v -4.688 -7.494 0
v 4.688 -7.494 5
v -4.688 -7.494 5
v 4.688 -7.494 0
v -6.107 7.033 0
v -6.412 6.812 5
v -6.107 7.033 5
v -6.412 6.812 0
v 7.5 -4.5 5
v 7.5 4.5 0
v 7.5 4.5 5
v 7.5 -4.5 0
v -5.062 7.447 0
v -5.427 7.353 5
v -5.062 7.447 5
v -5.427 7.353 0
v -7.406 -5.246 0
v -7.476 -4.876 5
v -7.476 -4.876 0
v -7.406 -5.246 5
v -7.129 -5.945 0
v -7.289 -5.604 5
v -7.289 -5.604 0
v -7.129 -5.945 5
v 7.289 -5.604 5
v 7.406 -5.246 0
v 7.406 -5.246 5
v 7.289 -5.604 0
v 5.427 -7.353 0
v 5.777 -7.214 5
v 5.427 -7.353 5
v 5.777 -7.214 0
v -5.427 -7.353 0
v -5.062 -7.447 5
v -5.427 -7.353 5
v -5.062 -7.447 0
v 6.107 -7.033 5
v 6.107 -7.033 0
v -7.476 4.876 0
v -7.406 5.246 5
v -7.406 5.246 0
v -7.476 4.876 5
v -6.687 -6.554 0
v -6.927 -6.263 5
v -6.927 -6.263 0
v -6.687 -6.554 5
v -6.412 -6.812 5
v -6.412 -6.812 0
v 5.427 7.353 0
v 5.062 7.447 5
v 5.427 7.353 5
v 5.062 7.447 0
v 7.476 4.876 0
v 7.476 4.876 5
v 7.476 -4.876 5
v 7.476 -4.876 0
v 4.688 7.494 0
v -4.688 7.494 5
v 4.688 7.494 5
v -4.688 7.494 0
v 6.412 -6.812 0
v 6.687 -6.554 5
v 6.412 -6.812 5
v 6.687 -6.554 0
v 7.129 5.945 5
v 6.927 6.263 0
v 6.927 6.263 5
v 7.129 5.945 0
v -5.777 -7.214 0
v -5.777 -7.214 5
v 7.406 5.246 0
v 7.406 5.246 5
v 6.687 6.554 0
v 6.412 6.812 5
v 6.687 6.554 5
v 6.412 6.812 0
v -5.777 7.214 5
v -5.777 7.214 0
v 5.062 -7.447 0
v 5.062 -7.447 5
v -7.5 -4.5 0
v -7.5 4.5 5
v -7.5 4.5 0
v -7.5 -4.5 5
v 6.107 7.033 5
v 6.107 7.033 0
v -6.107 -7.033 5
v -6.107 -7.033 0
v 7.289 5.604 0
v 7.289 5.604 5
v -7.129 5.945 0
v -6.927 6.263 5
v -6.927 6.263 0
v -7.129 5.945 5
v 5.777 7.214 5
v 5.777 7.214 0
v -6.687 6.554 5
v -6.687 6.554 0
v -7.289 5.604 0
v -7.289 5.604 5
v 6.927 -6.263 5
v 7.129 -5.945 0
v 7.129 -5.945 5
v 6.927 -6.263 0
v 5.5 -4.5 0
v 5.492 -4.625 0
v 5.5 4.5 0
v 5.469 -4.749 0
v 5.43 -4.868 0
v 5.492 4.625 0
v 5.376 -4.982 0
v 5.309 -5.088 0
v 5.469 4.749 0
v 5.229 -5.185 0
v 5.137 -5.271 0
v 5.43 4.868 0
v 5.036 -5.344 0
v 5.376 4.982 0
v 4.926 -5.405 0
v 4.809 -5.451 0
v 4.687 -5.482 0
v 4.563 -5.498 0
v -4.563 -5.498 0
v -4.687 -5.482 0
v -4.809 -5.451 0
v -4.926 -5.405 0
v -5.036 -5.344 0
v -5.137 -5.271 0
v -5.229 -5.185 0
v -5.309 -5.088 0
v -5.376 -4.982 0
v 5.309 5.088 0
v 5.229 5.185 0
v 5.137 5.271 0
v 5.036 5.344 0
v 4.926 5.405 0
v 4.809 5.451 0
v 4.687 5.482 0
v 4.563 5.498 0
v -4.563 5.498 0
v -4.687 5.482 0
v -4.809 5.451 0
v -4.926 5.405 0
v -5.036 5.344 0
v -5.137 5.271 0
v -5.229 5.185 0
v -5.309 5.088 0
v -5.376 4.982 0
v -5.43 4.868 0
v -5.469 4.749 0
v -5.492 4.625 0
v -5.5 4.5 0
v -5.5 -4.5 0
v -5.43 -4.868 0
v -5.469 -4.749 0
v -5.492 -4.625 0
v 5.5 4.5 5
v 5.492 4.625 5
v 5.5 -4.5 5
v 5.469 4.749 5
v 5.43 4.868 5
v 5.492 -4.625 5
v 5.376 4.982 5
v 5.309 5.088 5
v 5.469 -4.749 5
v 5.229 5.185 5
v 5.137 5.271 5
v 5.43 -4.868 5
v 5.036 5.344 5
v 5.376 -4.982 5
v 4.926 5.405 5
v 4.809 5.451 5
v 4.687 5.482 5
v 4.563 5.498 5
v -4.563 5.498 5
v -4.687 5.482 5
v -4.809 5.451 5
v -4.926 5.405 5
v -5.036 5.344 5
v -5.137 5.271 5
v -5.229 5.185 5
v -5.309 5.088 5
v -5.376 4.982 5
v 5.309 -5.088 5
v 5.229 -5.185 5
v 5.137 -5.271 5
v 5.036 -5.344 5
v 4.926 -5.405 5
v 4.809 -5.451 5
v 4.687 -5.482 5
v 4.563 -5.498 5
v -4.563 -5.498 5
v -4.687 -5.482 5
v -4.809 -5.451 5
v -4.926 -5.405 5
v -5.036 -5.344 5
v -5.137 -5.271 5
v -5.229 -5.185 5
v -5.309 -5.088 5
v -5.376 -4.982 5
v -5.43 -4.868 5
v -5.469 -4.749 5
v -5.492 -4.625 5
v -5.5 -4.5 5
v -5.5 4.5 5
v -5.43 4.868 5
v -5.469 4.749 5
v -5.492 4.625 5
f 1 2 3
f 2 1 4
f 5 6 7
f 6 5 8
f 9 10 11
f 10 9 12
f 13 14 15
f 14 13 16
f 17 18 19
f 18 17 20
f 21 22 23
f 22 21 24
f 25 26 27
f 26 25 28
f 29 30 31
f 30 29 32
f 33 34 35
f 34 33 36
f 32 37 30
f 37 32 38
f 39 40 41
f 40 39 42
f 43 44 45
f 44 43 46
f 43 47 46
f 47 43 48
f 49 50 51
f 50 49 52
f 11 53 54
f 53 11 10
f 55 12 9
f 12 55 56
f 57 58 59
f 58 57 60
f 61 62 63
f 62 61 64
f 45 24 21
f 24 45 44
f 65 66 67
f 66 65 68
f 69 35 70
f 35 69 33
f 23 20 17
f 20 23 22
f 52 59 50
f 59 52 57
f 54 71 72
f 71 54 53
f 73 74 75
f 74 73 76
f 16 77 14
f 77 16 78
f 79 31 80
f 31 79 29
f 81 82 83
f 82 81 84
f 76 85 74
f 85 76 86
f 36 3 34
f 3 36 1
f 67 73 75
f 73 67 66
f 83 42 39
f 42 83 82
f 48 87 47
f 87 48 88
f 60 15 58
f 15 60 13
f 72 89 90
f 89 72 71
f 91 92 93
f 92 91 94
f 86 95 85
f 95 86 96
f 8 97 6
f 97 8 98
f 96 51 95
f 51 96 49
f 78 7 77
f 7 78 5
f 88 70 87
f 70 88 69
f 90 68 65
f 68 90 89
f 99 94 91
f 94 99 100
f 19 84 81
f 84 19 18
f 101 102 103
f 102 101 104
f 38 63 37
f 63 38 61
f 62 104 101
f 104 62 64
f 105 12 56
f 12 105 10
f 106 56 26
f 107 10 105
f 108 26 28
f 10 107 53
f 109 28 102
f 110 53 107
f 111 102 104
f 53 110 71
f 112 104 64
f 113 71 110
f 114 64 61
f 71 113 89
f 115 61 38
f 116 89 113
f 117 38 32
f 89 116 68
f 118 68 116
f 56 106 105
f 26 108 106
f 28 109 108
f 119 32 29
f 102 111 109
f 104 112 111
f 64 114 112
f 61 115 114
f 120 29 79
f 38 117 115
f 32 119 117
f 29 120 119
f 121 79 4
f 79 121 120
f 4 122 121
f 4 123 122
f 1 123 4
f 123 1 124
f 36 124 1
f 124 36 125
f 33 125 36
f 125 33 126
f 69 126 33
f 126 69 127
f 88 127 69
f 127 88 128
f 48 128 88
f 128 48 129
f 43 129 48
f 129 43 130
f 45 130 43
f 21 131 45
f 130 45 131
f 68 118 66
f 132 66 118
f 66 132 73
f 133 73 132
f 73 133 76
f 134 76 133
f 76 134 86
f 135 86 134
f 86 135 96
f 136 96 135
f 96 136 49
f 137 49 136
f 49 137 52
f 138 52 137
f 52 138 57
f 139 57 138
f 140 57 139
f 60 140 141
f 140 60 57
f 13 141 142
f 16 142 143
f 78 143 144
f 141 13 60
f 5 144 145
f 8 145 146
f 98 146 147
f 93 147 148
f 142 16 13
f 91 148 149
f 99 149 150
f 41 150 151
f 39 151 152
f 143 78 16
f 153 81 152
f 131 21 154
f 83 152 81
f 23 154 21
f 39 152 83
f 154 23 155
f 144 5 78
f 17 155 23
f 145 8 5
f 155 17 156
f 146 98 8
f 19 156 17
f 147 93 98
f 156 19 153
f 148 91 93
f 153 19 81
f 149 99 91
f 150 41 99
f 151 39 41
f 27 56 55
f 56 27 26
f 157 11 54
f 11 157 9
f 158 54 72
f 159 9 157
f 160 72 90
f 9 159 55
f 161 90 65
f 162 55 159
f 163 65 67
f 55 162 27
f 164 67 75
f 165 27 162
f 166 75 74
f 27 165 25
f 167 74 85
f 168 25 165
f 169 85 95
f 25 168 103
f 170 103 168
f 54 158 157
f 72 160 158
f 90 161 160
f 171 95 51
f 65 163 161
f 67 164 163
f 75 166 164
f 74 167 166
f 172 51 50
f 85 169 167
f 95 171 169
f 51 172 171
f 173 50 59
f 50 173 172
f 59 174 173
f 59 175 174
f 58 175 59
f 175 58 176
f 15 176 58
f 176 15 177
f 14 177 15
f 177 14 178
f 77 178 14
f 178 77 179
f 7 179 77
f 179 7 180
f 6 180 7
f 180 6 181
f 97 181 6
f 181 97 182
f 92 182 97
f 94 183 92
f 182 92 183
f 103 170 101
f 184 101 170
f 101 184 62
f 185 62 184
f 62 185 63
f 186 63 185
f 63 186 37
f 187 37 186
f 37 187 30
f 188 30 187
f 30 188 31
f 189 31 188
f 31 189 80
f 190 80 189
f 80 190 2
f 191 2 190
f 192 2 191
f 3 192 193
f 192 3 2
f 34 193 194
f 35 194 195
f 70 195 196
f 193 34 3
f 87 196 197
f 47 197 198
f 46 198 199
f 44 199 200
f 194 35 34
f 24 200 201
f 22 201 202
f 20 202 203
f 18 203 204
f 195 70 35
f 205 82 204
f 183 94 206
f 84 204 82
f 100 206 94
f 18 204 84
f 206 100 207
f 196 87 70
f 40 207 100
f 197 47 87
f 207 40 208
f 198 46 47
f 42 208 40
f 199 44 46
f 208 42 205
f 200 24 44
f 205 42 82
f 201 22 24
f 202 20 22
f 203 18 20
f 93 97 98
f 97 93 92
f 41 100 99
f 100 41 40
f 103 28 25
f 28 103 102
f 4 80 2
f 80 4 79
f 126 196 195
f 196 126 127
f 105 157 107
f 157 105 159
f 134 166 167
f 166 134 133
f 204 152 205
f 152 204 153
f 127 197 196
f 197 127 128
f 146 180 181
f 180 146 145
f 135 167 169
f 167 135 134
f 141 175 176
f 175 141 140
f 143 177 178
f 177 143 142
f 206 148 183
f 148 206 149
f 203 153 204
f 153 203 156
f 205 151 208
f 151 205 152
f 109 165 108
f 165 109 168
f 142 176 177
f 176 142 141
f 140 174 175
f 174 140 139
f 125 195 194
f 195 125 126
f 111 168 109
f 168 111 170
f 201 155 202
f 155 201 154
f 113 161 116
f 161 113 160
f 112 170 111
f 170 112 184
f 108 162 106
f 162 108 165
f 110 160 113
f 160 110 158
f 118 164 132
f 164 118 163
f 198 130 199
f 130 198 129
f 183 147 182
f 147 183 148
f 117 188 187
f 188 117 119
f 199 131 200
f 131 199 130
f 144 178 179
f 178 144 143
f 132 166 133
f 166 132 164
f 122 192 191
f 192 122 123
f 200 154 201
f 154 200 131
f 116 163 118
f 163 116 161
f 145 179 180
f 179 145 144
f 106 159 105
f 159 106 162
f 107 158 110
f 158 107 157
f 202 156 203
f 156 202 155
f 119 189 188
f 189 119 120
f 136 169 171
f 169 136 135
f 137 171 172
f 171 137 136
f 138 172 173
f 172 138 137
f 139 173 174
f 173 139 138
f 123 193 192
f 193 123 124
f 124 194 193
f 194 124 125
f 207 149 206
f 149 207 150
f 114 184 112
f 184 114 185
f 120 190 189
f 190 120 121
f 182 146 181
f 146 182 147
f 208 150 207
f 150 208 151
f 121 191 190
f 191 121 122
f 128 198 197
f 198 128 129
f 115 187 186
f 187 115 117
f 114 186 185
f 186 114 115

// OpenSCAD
$fn = 50;


difference() {
	union() {
		translate(v = [0, 0, 0]) {
			rotate(a = [0, 0, 0]) {
				difference() {
					union() {
						hull() {
							translate(v = [-4.5000000000, 4.5000000000, 0]) {
								cylinder(h = 5, r = 3);
							}
							translate(v = [4.5000000000, 4.5000000000, 0]) {
								cylinder(h = 5, r = 3);
							}
							translate(v = [-4.5000000000, -4.5000000000, 0]) {
								cylinder(h = 5, r = 3);
							}
							translate(v = [4.5000000000, -4.5000000000, 0]) {
								cylinder(h = 5, r = 3);
							}
						}
					}
					union() {
						hull() {
							translate(v = [-4.5000000000, 4.5000000000, 0]) {
								cylinder(h = 5, r = 1);
							}
							translate(v = [4.5000000000, 4.5000000000, 0]) {
								cylinder(h = 5, r = 1);
							}
							translate(v = [-4.5000000000, -4.5000000000, 0]) {
								cylinder(h = 5, r = 1);
							}
							translate(v = [4.5000000000, -4.5000000000, 0]) {
								cylinder(h = 5, r = 1);
							}
						}
					}
				}
			}
		}
	}
	union();
}
